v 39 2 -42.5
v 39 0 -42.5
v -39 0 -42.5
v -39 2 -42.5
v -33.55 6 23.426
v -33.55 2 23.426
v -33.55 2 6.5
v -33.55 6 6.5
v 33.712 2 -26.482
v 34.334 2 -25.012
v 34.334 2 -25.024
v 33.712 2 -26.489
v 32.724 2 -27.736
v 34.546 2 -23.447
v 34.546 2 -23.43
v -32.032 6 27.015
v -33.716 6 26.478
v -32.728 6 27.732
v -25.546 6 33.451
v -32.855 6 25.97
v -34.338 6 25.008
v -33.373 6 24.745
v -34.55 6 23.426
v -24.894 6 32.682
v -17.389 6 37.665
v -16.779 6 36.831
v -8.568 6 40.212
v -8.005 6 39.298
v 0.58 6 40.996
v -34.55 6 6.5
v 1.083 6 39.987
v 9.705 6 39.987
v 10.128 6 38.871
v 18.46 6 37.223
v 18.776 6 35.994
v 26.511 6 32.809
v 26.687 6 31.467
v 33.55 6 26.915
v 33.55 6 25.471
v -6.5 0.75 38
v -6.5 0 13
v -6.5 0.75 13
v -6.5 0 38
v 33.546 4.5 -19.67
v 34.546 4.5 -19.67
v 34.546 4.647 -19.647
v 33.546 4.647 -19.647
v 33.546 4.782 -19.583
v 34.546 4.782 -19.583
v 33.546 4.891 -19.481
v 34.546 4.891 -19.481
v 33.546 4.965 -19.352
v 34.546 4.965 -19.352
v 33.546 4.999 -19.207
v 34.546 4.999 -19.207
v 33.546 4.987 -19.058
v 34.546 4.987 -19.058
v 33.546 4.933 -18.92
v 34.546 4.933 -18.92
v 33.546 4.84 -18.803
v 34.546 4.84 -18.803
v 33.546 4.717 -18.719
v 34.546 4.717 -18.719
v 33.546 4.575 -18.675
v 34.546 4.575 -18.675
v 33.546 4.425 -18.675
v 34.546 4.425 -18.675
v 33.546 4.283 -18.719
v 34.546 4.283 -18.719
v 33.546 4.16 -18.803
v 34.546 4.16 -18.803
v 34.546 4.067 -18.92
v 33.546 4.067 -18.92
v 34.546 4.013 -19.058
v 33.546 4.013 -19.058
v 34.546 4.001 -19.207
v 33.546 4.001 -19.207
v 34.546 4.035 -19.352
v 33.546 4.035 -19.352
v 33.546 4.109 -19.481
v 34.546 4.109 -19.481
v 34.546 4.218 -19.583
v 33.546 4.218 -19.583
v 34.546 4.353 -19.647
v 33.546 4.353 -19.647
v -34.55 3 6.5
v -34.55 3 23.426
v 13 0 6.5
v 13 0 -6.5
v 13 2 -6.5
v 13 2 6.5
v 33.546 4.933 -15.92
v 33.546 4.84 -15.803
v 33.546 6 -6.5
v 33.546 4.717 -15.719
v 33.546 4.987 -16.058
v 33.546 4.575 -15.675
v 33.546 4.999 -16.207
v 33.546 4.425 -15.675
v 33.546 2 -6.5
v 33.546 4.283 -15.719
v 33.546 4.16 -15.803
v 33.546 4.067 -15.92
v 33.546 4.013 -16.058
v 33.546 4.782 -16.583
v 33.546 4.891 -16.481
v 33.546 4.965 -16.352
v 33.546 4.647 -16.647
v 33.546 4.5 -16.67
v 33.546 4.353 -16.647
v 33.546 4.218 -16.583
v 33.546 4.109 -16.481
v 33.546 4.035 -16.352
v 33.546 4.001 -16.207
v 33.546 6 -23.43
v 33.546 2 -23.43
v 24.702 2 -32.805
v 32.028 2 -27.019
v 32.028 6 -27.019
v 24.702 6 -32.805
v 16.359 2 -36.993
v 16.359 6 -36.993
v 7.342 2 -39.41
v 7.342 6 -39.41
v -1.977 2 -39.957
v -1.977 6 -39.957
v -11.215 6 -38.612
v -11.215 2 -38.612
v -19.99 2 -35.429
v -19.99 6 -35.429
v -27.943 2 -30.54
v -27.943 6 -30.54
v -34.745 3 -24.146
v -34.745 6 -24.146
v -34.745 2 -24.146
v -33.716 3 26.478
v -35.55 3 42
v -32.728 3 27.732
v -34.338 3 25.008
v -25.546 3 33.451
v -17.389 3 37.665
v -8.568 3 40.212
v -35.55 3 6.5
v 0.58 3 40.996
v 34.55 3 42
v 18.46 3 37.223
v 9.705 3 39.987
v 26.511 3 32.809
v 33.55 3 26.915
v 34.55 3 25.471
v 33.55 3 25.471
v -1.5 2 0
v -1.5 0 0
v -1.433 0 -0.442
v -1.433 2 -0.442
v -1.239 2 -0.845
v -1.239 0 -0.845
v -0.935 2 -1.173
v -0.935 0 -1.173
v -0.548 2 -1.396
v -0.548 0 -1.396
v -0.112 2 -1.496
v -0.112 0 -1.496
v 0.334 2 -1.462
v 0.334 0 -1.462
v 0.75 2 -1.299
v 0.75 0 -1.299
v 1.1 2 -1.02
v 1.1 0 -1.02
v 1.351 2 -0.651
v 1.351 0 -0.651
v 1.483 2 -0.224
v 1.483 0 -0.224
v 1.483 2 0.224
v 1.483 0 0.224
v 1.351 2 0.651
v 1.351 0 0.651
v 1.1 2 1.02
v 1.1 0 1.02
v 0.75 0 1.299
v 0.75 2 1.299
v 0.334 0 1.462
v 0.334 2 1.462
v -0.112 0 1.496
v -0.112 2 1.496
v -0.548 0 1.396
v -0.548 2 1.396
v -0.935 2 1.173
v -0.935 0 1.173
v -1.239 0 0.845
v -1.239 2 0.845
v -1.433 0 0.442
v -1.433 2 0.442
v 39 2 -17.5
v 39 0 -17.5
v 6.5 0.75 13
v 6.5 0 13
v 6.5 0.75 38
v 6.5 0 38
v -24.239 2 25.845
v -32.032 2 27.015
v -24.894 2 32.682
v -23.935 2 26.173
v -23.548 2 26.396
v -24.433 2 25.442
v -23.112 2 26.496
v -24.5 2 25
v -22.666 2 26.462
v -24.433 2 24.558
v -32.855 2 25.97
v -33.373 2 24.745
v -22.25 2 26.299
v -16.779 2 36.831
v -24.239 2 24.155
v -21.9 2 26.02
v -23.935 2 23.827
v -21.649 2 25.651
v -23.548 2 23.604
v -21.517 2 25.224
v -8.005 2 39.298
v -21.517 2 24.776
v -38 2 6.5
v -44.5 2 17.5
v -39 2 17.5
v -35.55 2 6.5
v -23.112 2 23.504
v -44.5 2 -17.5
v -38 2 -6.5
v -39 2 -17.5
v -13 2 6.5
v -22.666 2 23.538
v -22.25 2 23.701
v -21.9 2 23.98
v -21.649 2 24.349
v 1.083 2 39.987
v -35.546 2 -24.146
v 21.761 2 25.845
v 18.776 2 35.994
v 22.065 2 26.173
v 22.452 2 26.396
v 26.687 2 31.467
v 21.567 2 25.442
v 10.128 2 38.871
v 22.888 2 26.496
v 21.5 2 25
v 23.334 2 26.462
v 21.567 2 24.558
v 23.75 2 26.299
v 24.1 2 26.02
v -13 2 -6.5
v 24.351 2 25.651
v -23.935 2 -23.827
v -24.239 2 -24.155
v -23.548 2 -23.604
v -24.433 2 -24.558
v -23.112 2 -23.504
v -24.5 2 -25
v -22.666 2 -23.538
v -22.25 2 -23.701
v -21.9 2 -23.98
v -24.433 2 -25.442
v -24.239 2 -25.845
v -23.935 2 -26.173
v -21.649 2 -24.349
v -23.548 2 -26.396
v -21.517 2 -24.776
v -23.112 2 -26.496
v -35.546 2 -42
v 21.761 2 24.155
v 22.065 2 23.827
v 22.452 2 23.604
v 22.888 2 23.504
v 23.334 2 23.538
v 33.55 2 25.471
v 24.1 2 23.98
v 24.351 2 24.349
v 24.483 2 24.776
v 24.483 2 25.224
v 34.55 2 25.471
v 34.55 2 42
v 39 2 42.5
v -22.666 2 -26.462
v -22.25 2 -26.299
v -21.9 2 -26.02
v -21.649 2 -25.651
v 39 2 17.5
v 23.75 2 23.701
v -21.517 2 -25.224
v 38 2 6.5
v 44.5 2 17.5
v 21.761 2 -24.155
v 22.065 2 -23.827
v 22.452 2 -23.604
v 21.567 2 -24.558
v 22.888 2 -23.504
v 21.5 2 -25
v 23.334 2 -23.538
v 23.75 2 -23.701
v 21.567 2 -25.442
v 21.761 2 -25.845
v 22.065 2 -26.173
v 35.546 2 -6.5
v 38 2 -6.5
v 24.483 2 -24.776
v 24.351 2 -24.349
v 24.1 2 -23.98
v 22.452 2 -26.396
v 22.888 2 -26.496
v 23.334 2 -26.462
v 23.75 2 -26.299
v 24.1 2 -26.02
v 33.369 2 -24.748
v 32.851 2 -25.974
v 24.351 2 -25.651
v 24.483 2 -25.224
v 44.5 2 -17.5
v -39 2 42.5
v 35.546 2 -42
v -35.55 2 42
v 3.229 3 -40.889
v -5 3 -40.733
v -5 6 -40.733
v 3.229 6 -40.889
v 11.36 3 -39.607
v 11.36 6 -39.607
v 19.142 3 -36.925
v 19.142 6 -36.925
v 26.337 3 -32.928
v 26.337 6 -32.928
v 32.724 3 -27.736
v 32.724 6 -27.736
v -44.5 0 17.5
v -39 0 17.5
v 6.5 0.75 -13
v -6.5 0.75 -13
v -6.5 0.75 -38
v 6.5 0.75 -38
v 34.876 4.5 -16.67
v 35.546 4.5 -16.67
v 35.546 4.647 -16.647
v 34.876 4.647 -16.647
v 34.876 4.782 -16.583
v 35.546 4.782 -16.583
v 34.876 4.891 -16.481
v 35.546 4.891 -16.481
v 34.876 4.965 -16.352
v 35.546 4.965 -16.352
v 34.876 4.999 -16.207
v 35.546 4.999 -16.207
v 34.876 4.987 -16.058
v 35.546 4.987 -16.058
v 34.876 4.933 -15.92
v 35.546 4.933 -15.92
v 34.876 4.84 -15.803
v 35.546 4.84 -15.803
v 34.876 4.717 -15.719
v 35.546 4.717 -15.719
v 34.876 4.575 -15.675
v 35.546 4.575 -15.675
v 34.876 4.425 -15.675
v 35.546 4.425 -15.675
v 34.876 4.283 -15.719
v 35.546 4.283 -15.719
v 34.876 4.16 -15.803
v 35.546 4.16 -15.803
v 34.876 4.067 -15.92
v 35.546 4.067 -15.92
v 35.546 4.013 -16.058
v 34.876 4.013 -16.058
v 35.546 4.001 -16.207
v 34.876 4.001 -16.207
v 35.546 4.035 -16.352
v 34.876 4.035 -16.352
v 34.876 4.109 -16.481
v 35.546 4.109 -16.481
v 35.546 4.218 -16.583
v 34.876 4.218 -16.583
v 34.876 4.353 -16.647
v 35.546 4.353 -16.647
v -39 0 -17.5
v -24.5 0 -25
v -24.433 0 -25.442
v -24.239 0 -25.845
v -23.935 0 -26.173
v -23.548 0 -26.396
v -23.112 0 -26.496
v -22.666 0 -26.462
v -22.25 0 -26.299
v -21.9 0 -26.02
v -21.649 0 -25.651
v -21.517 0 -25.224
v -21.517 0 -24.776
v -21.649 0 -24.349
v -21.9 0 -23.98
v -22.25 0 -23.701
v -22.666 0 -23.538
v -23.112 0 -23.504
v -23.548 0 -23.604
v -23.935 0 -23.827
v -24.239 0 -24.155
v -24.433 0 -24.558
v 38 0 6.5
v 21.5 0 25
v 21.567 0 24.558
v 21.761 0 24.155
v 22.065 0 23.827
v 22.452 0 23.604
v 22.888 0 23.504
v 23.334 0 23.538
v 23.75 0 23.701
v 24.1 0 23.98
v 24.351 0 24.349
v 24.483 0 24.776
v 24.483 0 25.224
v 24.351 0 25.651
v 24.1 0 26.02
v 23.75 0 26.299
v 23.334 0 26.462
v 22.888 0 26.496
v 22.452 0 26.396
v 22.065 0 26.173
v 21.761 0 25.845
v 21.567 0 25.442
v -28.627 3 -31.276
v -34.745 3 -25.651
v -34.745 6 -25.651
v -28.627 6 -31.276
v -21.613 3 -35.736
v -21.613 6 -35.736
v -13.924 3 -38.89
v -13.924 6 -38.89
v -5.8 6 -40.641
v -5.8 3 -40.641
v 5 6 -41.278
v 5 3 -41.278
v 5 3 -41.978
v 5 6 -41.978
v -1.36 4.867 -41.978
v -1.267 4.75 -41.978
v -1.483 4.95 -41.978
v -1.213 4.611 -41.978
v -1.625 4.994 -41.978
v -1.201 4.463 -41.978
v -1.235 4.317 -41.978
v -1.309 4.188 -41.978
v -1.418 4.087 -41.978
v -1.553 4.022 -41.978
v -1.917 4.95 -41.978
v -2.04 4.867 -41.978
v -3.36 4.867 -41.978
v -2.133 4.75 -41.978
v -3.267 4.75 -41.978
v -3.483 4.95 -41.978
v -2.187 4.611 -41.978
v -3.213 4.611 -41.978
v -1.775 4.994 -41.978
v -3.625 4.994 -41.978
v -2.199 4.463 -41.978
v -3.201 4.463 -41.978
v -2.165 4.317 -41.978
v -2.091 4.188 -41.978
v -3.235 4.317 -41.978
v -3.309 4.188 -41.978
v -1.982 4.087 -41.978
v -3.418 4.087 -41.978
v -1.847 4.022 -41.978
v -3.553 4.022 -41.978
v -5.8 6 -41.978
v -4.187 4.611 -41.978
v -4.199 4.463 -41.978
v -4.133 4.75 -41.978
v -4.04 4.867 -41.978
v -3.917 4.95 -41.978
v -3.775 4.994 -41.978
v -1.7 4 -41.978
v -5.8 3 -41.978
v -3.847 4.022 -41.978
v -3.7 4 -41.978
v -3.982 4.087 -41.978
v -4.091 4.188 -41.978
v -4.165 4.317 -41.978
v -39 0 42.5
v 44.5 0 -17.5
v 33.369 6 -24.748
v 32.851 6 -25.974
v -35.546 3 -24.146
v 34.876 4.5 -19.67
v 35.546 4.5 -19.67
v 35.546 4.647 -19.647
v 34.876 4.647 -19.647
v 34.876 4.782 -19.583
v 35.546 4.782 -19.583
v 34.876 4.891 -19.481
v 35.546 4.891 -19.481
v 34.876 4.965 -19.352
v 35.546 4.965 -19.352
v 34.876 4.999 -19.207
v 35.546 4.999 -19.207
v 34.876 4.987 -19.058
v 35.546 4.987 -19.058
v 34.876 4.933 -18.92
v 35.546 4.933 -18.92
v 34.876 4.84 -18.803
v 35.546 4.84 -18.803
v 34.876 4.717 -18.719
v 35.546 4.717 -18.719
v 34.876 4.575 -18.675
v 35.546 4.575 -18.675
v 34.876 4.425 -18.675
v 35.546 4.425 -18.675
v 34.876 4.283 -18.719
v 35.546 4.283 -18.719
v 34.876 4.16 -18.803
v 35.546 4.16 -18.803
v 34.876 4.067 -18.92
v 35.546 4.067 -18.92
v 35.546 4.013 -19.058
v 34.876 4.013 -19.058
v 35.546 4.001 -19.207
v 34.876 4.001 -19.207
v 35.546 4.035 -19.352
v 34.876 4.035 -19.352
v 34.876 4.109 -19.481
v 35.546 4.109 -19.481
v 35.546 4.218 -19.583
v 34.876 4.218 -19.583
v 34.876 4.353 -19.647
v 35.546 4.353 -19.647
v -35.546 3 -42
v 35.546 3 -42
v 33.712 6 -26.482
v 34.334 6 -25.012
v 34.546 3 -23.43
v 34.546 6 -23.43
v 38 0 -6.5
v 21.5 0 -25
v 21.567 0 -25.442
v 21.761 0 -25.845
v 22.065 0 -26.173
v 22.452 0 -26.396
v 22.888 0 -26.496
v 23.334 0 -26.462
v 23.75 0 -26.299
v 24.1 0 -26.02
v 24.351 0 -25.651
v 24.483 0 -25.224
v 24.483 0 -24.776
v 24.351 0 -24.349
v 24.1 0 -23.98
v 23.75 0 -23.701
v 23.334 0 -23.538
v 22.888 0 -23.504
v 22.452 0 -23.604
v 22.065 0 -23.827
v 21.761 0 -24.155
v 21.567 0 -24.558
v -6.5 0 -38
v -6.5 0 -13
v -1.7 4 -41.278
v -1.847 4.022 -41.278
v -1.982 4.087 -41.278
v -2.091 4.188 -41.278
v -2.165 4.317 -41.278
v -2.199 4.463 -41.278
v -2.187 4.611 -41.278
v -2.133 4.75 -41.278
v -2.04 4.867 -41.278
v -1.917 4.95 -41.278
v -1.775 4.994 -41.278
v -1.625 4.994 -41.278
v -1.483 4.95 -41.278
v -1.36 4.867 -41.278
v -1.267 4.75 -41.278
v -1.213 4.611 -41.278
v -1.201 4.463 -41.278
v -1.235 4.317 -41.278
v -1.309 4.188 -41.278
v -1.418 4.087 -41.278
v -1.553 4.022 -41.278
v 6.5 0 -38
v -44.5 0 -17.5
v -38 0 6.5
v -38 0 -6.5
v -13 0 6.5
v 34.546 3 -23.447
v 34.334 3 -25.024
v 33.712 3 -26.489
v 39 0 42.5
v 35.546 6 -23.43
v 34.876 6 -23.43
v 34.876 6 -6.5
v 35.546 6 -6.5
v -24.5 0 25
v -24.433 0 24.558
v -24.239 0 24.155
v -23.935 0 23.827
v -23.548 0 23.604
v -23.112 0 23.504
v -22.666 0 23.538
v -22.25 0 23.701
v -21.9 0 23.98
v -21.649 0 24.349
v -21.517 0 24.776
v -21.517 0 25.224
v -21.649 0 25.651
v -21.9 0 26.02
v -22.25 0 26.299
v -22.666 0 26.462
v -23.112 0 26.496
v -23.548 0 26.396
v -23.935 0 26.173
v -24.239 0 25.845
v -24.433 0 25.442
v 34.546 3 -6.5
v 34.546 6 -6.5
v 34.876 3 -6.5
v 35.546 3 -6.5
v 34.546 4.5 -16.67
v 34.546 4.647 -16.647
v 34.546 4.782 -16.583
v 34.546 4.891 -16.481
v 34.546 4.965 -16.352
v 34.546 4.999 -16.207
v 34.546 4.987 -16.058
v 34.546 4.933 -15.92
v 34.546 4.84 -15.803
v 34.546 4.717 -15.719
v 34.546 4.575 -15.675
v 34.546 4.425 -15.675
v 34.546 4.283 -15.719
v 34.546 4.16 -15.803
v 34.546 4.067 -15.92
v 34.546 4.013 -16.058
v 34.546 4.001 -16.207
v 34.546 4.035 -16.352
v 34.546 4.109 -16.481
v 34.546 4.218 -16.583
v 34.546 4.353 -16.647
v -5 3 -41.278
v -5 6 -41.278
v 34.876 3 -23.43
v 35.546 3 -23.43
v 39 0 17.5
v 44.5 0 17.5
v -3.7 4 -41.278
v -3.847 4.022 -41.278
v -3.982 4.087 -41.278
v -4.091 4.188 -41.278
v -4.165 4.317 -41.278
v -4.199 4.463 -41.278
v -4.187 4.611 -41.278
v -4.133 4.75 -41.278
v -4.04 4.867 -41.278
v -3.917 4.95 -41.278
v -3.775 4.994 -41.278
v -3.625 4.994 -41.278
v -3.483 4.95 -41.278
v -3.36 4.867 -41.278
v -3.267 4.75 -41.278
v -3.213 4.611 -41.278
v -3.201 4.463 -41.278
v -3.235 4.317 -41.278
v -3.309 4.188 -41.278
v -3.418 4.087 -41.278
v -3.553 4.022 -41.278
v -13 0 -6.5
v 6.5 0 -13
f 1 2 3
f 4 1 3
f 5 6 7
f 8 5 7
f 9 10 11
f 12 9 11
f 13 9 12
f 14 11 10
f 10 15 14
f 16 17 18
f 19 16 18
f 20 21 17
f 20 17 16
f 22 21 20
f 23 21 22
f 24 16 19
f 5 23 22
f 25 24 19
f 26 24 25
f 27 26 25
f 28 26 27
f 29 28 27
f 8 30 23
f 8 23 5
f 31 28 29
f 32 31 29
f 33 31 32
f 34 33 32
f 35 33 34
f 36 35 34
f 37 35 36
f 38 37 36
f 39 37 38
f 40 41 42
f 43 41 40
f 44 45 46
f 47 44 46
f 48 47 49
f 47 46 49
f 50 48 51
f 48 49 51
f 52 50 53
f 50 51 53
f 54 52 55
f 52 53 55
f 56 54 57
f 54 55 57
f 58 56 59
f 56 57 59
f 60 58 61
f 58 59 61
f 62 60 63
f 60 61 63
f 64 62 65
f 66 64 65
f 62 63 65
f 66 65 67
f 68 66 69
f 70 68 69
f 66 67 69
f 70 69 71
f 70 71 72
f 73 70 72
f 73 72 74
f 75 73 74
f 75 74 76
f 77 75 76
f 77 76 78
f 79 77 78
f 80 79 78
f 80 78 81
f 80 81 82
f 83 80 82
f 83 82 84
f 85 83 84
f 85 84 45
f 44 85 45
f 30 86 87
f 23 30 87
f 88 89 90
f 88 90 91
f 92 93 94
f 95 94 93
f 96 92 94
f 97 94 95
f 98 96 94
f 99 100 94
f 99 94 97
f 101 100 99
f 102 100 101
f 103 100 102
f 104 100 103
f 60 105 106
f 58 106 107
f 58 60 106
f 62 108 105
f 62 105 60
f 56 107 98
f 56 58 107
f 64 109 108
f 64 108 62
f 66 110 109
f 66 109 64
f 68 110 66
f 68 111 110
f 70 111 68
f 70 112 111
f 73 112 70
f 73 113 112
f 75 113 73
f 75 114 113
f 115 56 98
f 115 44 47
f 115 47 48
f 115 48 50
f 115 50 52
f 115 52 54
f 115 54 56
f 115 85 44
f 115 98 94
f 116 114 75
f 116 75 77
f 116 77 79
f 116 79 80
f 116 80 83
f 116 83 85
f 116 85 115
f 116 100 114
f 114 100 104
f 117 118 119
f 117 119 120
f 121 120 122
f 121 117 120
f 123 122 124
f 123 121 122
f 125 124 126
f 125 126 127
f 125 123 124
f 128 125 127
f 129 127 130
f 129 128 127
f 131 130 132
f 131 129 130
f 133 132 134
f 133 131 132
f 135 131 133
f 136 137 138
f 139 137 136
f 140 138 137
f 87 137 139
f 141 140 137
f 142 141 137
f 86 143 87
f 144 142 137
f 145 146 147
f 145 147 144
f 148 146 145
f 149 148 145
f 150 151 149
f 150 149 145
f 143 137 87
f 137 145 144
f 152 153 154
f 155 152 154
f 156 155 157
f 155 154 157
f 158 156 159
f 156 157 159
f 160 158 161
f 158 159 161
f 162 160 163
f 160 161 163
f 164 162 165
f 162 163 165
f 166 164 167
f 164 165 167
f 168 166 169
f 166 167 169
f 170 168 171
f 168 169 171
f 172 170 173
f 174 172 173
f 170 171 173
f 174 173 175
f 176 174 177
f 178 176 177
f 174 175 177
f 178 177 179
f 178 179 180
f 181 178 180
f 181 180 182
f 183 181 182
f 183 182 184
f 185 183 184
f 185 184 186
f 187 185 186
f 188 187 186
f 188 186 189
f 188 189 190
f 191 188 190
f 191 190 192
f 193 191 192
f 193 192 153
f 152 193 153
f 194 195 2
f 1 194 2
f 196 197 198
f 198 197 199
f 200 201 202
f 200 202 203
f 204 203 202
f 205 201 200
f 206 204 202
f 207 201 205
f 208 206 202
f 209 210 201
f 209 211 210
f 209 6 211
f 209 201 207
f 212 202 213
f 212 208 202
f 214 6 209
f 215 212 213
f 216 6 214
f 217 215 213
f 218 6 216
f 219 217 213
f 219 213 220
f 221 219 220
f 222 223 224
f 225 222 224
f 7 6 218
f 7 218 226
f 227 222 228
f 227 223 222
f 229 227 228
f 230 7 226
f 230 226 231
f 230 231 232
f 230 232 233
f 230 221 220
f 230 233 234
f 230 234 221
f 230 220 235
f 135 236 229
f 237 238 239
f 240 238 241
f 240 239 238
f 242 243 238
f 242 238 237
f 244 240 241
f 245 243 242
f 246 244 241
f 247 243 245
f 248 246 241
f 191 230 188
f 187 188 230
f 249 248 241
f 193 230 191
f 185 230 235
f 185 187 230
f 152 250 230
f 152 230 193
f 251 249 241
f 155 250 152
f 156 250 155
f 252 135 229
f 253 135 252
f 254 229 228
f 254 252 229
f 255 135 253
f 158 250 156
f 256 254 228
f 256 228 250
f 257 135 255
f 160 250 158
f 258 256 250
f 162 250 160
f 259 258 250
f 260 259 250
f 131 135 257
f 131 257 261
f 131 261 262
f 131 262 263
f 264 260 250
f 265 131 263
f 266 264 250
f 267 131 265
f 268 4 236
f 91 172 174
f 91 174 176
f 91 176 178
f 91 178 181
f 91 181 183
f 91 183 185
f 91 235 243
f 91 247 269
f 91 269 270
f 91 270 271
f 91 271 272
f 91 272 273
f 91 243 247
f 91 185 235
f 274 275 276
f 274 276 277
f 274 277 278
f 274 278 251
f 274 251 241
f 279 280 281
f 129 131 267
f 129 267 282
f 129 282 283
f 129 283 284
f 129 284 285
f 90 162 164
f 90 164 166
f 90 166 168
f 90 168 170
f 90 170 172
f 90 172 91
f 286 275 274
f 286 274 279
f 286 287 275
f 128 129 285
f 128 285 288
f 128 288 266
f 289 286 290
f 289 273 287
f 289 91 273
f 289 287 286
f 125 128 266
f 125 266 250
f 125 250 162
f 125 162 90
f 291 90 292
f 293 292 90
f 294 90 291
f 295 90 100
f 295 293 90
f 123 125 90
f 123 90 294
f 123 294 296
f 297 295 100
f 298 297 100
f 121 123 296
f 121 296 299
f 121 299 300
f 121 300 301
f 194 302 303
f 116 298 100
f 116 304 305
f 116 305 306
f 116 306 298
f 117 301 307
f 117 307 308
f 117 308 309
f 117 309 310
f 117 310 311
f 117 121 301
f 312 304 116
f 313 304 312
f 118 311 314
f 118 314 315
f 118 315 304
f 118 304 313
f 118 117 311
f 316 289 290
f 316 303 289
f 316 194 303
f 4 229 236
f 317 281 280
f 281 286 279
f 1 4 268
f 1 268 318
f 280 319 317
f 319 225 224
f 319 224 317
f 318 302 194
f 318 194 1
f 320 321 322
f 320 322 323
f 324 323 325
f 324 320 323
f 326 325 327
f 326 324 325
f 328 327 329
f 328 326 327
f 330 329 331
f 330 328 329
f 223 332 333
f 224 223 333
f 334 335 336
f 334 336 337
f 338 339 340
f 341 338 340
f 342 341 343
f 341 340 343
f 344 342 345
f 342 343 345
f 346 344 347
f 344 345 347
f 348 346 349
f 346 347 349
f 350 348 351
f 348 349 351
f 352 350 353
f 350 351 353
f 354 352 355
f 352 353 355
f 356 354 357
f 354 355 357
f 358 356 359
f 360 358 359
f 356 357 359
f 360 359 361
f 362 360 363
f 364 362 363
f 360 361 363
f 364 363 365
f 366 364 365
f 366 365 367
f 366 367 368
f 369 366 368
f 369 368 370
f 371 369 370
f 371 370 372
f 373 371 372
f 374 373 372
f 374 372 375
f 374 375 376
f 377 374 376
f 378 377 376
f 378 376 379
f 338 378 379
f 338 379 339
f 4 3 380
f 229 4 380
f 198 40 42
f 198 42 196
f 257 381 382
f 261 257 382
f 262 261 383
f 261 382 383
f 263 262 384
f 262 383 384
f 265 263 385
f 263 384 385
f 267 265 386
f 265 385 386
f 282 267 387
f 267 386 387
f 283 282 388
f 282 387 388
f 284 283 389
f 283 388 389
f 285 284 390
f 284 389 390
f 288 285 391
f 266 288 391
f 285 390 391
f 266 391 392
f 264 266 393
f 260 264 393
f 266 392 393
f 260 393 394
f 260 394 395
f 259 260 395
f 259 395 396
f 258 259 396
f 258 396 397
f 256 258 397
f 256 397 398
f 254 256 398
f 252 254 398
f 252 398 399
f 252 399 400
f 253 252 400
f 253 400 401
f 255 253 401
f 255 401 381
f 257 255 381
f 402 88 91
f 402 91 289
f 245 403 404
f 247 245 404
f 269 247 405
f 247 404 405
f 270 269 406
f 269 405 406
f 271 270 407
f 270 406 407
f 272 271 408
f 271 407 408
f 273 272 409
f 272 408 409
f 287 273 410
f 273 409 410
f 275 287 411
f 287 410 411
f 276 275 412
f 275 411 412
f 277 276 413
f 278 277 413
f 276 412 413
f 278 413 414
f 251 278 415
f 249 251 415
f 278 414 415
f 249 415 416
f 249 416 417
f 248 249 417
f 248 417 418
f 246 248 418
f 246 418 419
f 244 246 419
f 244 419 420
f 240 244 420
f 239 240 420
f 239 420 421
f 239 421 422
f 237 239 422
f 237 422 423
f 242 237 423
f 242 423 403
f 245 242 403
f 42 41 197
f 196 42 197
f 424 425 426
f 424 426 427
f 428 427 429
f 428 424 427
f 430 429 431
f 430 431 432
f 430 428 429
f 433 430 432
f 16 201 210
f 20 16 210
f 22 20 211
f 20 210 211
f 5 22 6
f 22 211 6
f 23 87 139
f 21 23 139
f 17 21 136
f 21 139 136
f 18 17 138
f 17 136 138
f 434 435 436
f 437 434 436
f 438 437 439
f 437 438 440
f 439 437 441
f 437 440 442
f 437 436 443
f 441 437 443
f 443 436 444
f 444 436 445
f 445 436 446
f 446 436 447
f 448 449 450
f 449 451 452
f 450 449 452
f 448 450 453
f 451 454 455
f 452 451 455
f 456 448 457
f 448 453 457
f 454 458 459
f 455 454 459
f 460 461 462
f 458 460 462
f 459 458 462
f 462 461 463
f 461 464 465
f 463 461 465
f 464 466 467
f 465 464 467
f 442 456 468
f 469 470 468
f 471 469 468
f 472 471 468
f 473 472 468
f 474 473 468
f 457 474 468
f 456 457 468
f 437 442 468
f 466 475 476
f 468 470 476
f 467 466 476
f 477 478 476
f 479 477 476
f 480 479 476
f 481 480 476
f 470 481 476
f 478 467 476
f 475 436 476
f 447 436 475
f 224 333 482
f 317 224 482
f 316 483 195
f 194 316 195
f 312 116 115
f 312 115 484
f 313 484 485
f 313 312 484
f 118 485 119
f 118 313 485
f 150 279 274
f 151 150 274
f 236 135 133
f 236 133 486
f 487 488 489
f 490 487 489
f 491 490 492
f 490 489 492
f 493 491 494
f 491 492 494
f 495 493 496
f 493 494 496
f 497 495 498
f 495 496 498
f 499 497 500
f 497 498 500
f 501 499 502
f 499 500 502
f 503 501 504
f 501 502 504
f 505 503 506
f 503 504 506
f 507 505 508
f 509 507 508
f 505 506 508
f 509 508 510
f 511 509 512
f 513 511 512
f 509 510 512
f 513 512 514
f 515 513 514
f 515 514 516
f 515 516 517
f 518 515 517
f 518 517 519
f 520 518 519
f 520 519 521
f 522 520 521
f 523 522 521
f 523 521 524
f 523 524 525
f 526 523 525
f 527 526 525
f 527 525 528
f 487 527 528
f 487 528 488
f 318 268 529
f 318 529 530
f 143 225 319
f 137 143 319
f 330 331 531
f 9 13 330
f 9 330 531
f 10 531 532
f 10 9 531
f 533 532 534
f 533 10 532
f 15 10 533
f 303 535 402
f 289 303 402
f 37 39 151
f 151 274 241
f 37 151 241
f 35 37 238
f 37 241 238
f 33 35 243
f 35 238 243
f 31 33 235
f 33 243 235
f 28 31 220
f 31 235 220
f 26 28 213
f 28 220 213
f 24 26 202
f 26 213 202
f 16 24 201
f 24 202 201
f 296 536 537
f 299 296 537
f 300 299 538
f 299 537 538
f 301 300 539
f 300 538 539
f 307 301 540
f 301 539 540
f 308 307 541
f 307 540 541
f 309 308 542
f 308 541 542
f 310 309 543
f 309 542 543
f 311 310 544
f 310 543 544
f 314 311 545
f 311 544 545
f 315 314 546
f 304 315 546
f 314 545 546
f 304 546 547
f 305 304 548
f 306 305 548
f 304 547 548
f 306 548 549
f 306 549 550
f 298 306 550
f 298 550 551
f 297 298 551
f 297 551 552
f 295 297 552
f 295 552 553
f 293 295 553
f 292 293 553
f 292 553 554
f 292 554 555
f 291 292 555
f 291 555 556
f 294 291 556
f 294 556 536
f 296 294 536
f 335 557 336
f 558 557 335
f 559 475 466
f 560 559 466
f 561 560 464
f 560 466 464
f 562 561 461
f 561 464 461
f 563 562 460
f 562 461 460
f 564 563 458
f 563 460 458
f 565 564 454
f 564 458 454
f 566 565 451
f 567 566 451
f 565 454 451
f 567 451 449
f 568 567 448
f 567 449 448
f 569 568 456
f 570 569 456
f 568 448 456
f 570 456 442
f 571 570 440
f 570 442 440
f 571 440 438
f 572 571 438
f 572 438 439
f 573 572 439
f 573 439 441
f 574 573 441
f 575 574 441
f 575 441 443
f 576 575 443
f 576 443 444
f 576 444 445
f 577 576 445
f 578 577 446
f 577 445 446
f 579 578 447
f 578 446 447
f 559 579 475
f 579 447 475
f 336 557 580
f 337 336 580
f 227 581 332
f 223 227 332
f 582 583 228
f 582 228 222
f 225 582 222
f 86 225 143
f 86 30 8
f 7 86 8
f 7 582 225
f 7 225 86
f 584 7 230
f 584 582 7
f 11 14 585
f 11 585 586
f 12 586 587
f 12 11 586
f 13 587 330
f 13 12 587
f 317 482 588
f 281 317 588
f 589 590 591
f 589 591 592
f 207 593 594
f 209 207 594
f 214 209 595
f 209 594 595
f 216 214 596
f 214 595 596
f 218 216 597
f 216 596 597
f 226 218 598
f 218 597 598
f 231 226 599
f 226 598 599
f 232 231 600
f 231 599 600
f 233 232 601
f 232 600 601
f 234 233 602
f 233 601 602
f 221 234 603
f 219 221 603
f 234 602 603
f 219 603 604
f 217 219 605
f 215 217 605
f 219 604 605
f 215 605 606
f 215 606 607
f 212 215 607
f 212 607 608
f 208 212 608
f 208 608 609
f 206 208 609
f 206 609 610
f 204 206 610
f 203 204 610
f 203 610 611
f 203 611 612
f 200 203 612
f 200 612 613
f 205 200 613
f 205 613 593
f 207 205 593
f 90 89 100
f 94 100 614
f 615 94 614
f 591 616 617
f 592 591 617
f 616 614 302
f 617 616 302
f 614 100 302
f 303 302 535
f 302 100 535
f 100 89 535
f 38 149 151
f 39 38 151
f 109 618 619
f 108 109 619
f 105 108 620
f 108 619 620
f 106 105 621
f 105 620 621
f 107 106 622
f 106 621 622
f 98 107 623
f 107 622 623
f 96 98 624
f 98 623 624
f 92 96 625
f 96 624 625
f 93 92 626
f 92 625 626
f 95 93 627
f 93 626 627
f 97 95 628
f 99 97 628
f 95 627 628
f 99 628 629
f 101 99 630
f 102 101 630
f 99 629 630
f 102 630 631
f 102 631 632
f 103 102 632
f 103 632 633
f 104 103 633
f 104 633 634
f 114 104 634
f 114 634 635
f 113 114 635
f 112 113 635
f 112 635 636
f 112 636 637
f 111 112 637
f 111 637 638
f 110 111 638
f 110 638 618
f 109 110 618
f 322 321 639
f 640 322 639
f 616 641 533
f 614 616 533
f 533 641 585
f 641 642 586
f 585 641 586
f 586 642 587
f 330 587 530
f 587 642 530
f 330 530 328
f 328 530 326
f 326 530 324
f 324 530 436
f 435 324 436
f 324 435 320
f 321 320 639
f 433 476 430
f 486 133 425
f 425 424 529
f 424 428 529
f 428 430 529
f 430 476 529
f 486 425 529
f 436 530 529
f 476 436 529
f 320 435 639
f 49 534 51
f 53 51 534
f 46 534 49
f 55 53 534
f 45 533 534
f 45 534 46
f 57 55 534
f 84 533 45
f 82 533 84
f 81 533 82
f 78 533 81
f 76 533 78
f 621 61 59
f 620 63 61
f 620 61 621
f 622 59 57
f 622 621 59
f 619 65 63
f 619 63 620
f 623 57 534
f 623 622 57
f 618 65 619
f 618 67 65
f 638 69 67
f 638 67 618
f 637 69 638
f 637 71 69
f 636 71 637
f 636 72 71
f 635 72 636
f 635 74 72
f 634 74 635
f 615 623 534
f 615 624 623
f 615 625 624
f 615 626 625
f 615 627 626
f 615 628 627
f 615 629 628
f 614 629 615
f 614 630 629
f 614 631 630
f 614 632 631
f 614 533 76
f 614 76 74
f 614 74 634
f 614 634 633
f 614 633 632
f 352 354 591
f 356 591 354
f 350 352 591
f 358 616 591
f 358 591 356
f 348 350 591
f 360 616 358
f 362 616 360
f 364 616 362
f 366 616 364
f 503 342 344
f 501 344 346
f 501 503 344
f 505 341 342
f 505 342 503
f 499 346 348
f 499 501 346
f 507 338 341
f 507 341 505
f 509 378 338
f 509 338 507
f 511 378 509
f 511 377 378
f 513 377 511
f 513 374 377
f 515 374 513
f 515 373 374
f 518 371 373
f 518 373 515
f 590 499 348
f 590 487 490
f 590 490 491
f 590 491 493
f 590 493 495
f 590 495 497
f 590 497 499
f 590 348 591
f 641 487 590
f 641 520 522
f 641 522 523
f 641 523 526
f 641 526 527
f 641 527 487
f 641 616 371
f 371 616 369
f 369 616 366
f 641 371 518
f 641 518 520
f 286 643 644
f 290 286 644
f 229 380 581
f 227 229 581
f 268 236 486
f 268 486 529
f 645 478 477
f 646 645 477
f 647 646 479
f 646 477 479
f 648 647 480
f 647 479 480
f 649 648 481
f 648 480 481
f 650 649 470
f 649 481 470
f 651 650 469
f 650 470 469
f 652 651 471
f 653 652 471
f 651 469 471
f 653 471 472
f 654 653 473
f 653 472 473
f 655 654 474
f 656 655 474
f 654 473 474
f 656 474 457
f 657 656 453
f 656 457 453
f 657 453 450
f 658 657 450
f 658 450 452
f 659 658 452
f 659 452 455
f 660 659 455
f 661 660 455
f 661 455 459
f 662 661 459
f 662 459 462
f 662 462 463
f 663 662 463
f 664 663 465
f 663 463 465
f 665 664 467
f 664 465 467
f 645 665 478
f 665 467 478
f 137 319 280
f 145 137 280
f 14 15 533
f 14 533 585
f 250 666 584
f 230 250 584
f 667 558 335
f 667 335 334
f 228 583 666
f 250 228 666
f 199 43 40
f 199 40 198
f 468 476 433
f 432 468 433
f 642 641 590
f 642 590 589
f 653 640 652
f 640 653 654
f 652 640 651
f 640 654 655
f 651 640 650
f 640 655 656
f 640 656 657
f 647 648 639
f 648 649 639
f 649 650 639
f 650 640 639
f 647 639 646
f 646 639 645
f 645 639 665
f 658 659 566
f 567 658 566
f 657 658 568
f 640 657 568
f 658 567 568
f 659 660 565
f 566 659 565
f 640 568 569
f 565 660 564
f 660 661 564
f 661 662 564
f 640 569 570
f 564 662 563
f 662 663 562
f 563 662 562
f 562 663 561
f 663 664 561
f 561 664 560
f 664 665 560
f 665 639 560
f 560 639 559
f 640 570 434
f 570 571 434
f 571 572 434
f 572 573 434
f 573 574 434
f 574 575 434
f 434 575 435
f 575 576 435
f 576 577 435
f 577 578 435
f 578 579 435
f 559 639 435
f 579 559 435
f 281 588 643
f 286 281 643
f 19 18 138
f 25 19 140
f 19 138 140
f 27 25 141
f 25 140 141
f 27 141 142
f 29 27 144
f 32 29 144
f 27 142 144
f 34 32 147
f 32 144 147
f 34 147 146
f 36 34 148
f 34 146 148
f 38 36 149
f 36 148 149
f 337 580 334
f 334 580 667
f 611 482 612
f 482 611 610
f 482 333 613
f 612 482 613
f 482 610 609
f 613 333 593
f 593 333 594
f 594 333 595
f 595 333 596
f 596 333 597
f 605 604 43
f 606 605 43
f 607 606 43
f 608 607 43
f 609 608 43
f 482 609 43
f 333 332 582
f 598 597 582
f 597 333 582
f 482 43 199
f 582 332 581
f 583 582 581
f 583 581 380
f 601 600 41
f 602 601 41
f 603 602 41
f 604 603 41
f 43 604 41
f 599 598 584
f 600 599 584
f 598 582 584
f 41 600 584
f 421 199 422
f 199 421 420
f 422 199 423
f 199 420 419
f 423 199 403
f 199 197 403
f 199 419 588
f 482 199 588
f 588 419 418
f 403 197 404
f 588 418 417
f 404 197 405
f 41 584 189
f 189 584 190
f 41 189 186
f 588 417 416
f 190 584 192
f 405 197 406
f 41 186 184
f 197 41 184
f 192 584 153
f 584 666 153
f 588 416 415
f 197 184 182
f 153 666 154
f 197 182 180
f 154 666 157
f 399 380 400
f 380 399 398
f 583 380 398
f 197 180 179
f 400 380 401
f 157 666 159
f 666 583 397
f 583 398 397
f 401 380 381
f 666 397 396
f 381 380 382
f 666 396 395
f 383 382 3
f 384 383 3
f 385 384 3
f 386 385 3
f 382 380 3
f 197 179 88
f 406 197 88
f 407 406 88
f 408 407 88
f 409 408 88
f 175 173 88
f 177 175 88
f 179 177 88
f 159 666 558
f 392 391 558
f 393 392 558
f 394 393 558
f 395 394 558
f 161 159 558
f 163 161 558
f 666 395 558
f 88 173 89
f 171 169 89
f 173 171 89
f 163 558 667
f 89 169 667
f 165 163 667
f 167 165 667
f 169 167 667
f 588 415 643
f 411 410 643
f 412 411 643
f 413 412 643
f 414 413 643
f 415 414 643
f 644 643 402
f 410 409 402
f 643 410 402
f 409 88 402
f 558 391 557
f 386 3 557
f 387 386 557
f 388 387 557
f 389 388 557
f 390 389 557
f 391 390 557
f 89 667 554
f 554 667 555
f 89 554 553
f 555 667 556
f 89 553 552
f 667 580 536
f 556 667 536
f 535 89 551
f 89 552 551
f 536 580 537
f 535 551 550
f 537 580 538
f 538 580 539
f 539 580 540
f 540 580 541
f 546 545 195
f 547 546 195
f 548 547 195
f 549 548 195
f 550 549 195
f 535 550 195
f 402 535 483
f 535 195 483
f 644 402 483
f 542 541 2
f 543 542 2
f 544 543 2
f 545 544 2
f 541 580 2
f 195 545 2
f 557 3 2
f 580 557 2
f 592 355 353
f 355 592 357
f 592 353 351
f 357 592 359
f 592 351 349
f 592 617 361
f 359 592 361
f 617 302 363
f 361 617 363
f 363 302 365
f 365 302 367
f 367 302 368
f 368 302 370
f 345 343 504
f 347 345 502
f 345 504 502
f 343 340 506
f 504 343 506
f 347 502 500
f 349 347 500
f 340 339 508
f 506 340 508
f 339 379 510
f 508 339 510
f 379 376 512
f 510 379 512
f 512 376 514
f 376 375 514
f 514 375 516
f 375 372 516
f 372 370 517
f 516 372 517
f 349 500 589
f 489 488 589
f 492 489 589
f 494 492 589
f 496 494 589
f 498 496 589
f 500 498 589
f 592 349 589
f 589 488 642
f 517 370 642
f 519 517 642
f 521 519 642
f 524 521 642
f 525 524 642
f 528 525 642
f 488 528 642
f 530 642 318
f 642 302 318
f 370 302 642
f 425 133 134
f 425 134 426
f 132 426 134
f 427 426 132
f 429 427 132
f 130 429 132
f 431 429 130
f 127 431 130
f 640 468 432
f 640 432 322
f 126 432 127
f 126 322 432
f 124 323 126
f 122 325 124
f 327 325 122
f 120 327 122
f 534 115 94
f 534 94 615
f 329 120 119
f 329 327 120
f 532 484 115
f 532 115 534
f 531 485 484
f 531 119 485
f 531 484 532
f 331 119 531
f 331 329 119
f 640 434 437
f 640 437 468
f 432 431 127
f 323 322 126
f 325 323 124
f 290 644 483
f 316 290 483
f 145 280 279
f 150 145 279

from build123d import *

# Parameters (mm, degrees)
BOSS_EXTRUDE1_DEPTH               = 2
BOSS_EXTRUDE2_DEPTH               = 4
BOSS_EXTRUDE3_DEPTH               = 1
BOSS_EXTRUDE4_DEPTH               = 3
SKETCH7_W                         = 13
SKETCH7_H                         = 25
CUT_EXTRUDE2_DEPTH                = 0.75
F_3_0_3_DIAMETER_HOLE1_D          = 3
SKETCH12_W                        = 0.5
SKETCH12_H                        = 1.222432211
F_1_0_1_DIAMETER_HOLE1_AT_2_COUNT = 2
F_1_0_1_DIAMETER_HOLE1_AT_2_PITCH = 2
F_1_0_1_DIAMETER_HOLE2_D          = 1
F_1_0_1_DIAMETER_HOLE2_DEPTH      = 3
SKETCH18_W                        = 25
SKETCH18_H                        = 13
CUT_EXTRUDE4_DEPTH                = 10
SKETCH19_W                        = 25
SKETCH19_H                        = 13
CUT_EXTRUDE5_DEPTH                = 62.758096635
SKETCH20_W                        = 0.67
SKETCH20_H                        = 16.929710607
BOSS_EXTRUDE5_DEPTH               = 3
F_1_0_1_DIAMETER_HOLE3_D          = 1
F_1_0_1_DIAMETER_HOLE3_DEPTH      = 3


with BuildPart() as part:
    # Sketch1 → Boss-Extrude1 (new body)
    with BuildSketch(Plane(origin=(0, 0, 0), x_dir=(1, 0, 0), z_dir=(0, 1, 0))):
        Polygon((17.5, 42.5), (-39, 42.5), (-39, 17.5), (-44.5, 17.5), (-44.5, -17.5), (-39, -17.5), (-39, -42.5), (17.5, -42.5), (39, -42.5), (39, -17.5), (44.5, -17.5), (44.5, 17.5), (39, 17.5), (39, 42.5), align=None)
    extrude(amount=BOSS_EXTRUDE1_DEPTH)

    # Sketch2 → Boss-Extrude2 (add)
    with BuildSketch(Plane(origin=(0, 2, 0), x_dir=(1, 0, 0), z_dir=(0, 1, 0))):
        with BuildLine():
            Line((34.546315587, 23.429710607), (34.546315587, 0))
            Line((34.546315587, 0), (33.546315587, 0))
            Line((33.546315587, 0), (33.546315587, 23.429710607))
            ThreePointArc((33.546315587, 23.429710607), (33.151002872, 25.378262634), (32.027573585, 27.018699705))
            ThreePointArc((32.027573585, 27.018699705), (-1.976971125, 39.957497595), (-34.744767591, 24.14632855))
            Line((-34.744767591, 24.14632855), (-34.744767591, 25.651242078))
            ThreePointArc((-34.744767591, 25.651242078), (-1.451938229, 40.977567789), (32.723825185, 27.736497525))
            ThreePointArc((32.723825185, 27.736497525), (34.071940329, 25.76797304), (34.546315587, 23.429710607))
        make_face()
        with BuildLine():
            Line((33.55, -26.915004177), (33.55, -25.470581501))
            ThreePointArc((33.55, -25.470581501), (1.082760633, -39.987255076), (-32.031707317, -27.014689554))
            ThreePointArc((-32.031707317, -27.014689554), (-33.154809257, -25.374400109), (-33.55, -23.426136342))
            Line((-33.55, -23.426136342), (-33.55, 0))
            Line((-33.55, 0), (-34.55, 0))
            Line((-34.55, 0), (-34.55, -23.426136342))
            ThreePointArc((-34.55, -23.426136342), (-34.075771108, -25.764052863), (-32.72804878, -27.732400197))
            ThreePointArc((-32.72804878, -27.732400197), (0.579599012, -40.996426087), (33.55, -26.915004177))
        make_face()
    extrude(amount=BOSS_EXTRUDE2_DEPTH)

    # Sketch3 → Boss-Extrude3 (add)
    with BuildSketch(Plane(origin=(0, 2, 0), x_dir=(1, 0, 0), z_dir=(0, 1, 0))):
        with BuildLine():
            Line((-35.546315587, 42), (35.546315587, 42))
            Line((35.546315587, 42), (35.546315587, 0))
            Line((35.546315587, 0), (34.546315587, 0))
            Line((34.546315587, 0), (34.546315587, 23.446970837))
            ThreePointArc((34.546315587, 23.446970837), (34.071801154, 25.777287901), (32.723825185, 27.736497525))
            ThreePointArc((32.723825185, 27.736497525), (-1.450164751, 40.920186771), (-34.744767591, 25.651242078))
            Line((-34.744767591, 25.651242078), (-34.744767591, 24.14632855))
            Line((-34.744767591, 24.14632855), (-35.546315587, 24.14632855))
            Line((-35.546315587, 24.14632855), (-35.546315587, 25.914938844))
            Line((-35.546315587, 25.914938844), (-35.546315587, 42))
        make_face()
        with BuildLine():
            Line((-35.55, -42), (34.55, -42))
            Line((34.55, -42), (34.55, -25.470581501))
            Line((34.55, -25.470581501), (33.55, -25.470581501))
            Line((33.55, -25.470581501), (33.55, -26.915004177))
            ThreePointArc((33.55, -26.915004177), (0.579599012, -40.996426087), (-32.72804878, -27.732400197))
            ThreePointArc((-32.72804878, -27.732400197), (-34.075771108, -25.764052863), (-34.55, -23.426136342))
            Line((-34.55, -23.426136342), (-34.55, 0))
            Line((-34.55, 0), (-35.55, 0))
            Line((-35.55, 0), (-35.55, -42))
        make_face()
    extrude(amount=BOSS_EXTRUDE3_DEPTH)

    # Sketch4 → Boss-Extrude4 (add)
    with BuildSketch(Plane(origin=(0, 3, 0), x_dir=(1, 0, 0), z_dir=(0, 1, 0))):
        Polygon((5, 41.977567789), (-5.8, 41.977567789), (-5.8, 40.077567789), (-5, 40.077567789), (-5, 41.277567789), (5, 41.277567789), align=None)
    extrude(amount=BOSS_EXTRUDE4_DEPTH)

    # Sketch7 → Cut-Extrude2 (cut)
    with BuildSketch(Plane.XZ):
        with Locations((0, -25.5)):
            Rectangle(SKETCH7_W, SKETCH7_H)
        with Locations((0, 25.5)):
            Rectangle(SKETCH7_W, SKETCH7_H)
    extrude(amount=-CUT_EXTRUDE2_DEPTH, mode=Mode.SUBTRACT)

    # Ø3.0 (3) Diameter Hole1 (through all)
    with Locations(Plane(origin=(0, 2, 0), x_dir=(1, 0, 0), z_dir=(0, 1, 0))):
        with Locations((-23, 25), (-23, -25), (23, -25), (23, 25), (0, 0)):
            Hole(F_3_0_3_DIAMETER_HOLE1_D / 2)

    # Sketch12 → Ø1.0 (1) Diameter Hole1 (revolve, cut)
    with BuildSketch(Plane(origin=(-3.7, 4.5, -41.277567789), x_dir=(0, -1, 0), z_dir=(1, 0, 0))):
        with Locations((0.25, 0.611216106)):
            Rectangle(SKETCH12_W, SKETCH12_H)
    f_1_0_1_diameter_hole1 = revolve(axis=Axis((-3.7, 4.5, -34.927567789), (0, 0, -1)), mode=Mode.SUBTRACT)

    # Ø1.0 (1) Diameter Hole1 at 2: Ø1.0 (1) Diameter Hole1 ×2
    with Locations(*[(i * F_1_0_1_DIAMETER_HOLE1_AT_2_PITCH, 0, 0) for i in range(1, F_1_0_1_DIAMETER_HOLE1_AT_2_COUNT)]):
        add(f_1_0_1_diameter_hole1, mode=Mode.SUBTRACT)

    # Ø1.0 (1) Diameter Hole2
    with Locations(Plane.ZY.offset(-33.546315587)):
        with Locations((-19.169710607, 4.5), (-16.169710607, 4.5)):
            Hole(F_1_0_1_DIAMETER_HOLE2_D / 2, depth=F_1_0_1_DIAMETER_HOLE2_DEPTH)

    # Sketch18 → Cut-Extrude4 (cut)
    with BuildSketch(Plane.XZ.offset(-0.75)):
        with Locations((-25.5, 0)):
            Rectangle(SKETCH18_W, SKETCH18_H)
        with Locations((25.5, 0)):
            Rectangle(SKETCH18_W, SKETCH18_H)
    extrude(amount=-CUT_EXTRUDE4_DEPTH, mode=Mode.SUBTRACT)

    # Sketch19 → Cut-Extrude5 (cut, through all)
    with BuildSketch(Plane(origin=(0, 0.75, 0), x_dir=(1, 0, 0), z_dir=(0, 1, 0))):
        with Locations((-25.5, 0)):
            Rectangle(SKETCH19_W, SKETCH19_H)
        with Locations((25.5, 0)):
            Rectangle(SKETCH19_W, SKETCH19_H)
    extrude(amount=-CUT_EXTRUDE5_DEPTH, mode=Mode.SUBTRACT)

    # Sketch20 → Boss-Extrude5 (add)
    with BuildSketch(Plane(origin=(0, 3, 0), x_dir=(1, 0, 0), z_dir=(0, 1, 0))):
        with Locations((35.211315587, 14.964855304)):
            Rectangle(SKETCH20_W, SKETCH20_H)
    extrude(amount=BOSS_EXTRUDE5_DEPTH)

    # Ø1.0 (1) Diameter Hole3
    with Locations(Plane.ZY.offset(-34.876315587)):
        with Locations((-19.169710607, 4.5), (-16.169710607, 4.5)):
            Hole(F_1_0_1_DIAMETER_HOLE3_D / 2, depth=F_1_0_1_DIAMETER_HOLE3_DEPTH)


solid = part.part
